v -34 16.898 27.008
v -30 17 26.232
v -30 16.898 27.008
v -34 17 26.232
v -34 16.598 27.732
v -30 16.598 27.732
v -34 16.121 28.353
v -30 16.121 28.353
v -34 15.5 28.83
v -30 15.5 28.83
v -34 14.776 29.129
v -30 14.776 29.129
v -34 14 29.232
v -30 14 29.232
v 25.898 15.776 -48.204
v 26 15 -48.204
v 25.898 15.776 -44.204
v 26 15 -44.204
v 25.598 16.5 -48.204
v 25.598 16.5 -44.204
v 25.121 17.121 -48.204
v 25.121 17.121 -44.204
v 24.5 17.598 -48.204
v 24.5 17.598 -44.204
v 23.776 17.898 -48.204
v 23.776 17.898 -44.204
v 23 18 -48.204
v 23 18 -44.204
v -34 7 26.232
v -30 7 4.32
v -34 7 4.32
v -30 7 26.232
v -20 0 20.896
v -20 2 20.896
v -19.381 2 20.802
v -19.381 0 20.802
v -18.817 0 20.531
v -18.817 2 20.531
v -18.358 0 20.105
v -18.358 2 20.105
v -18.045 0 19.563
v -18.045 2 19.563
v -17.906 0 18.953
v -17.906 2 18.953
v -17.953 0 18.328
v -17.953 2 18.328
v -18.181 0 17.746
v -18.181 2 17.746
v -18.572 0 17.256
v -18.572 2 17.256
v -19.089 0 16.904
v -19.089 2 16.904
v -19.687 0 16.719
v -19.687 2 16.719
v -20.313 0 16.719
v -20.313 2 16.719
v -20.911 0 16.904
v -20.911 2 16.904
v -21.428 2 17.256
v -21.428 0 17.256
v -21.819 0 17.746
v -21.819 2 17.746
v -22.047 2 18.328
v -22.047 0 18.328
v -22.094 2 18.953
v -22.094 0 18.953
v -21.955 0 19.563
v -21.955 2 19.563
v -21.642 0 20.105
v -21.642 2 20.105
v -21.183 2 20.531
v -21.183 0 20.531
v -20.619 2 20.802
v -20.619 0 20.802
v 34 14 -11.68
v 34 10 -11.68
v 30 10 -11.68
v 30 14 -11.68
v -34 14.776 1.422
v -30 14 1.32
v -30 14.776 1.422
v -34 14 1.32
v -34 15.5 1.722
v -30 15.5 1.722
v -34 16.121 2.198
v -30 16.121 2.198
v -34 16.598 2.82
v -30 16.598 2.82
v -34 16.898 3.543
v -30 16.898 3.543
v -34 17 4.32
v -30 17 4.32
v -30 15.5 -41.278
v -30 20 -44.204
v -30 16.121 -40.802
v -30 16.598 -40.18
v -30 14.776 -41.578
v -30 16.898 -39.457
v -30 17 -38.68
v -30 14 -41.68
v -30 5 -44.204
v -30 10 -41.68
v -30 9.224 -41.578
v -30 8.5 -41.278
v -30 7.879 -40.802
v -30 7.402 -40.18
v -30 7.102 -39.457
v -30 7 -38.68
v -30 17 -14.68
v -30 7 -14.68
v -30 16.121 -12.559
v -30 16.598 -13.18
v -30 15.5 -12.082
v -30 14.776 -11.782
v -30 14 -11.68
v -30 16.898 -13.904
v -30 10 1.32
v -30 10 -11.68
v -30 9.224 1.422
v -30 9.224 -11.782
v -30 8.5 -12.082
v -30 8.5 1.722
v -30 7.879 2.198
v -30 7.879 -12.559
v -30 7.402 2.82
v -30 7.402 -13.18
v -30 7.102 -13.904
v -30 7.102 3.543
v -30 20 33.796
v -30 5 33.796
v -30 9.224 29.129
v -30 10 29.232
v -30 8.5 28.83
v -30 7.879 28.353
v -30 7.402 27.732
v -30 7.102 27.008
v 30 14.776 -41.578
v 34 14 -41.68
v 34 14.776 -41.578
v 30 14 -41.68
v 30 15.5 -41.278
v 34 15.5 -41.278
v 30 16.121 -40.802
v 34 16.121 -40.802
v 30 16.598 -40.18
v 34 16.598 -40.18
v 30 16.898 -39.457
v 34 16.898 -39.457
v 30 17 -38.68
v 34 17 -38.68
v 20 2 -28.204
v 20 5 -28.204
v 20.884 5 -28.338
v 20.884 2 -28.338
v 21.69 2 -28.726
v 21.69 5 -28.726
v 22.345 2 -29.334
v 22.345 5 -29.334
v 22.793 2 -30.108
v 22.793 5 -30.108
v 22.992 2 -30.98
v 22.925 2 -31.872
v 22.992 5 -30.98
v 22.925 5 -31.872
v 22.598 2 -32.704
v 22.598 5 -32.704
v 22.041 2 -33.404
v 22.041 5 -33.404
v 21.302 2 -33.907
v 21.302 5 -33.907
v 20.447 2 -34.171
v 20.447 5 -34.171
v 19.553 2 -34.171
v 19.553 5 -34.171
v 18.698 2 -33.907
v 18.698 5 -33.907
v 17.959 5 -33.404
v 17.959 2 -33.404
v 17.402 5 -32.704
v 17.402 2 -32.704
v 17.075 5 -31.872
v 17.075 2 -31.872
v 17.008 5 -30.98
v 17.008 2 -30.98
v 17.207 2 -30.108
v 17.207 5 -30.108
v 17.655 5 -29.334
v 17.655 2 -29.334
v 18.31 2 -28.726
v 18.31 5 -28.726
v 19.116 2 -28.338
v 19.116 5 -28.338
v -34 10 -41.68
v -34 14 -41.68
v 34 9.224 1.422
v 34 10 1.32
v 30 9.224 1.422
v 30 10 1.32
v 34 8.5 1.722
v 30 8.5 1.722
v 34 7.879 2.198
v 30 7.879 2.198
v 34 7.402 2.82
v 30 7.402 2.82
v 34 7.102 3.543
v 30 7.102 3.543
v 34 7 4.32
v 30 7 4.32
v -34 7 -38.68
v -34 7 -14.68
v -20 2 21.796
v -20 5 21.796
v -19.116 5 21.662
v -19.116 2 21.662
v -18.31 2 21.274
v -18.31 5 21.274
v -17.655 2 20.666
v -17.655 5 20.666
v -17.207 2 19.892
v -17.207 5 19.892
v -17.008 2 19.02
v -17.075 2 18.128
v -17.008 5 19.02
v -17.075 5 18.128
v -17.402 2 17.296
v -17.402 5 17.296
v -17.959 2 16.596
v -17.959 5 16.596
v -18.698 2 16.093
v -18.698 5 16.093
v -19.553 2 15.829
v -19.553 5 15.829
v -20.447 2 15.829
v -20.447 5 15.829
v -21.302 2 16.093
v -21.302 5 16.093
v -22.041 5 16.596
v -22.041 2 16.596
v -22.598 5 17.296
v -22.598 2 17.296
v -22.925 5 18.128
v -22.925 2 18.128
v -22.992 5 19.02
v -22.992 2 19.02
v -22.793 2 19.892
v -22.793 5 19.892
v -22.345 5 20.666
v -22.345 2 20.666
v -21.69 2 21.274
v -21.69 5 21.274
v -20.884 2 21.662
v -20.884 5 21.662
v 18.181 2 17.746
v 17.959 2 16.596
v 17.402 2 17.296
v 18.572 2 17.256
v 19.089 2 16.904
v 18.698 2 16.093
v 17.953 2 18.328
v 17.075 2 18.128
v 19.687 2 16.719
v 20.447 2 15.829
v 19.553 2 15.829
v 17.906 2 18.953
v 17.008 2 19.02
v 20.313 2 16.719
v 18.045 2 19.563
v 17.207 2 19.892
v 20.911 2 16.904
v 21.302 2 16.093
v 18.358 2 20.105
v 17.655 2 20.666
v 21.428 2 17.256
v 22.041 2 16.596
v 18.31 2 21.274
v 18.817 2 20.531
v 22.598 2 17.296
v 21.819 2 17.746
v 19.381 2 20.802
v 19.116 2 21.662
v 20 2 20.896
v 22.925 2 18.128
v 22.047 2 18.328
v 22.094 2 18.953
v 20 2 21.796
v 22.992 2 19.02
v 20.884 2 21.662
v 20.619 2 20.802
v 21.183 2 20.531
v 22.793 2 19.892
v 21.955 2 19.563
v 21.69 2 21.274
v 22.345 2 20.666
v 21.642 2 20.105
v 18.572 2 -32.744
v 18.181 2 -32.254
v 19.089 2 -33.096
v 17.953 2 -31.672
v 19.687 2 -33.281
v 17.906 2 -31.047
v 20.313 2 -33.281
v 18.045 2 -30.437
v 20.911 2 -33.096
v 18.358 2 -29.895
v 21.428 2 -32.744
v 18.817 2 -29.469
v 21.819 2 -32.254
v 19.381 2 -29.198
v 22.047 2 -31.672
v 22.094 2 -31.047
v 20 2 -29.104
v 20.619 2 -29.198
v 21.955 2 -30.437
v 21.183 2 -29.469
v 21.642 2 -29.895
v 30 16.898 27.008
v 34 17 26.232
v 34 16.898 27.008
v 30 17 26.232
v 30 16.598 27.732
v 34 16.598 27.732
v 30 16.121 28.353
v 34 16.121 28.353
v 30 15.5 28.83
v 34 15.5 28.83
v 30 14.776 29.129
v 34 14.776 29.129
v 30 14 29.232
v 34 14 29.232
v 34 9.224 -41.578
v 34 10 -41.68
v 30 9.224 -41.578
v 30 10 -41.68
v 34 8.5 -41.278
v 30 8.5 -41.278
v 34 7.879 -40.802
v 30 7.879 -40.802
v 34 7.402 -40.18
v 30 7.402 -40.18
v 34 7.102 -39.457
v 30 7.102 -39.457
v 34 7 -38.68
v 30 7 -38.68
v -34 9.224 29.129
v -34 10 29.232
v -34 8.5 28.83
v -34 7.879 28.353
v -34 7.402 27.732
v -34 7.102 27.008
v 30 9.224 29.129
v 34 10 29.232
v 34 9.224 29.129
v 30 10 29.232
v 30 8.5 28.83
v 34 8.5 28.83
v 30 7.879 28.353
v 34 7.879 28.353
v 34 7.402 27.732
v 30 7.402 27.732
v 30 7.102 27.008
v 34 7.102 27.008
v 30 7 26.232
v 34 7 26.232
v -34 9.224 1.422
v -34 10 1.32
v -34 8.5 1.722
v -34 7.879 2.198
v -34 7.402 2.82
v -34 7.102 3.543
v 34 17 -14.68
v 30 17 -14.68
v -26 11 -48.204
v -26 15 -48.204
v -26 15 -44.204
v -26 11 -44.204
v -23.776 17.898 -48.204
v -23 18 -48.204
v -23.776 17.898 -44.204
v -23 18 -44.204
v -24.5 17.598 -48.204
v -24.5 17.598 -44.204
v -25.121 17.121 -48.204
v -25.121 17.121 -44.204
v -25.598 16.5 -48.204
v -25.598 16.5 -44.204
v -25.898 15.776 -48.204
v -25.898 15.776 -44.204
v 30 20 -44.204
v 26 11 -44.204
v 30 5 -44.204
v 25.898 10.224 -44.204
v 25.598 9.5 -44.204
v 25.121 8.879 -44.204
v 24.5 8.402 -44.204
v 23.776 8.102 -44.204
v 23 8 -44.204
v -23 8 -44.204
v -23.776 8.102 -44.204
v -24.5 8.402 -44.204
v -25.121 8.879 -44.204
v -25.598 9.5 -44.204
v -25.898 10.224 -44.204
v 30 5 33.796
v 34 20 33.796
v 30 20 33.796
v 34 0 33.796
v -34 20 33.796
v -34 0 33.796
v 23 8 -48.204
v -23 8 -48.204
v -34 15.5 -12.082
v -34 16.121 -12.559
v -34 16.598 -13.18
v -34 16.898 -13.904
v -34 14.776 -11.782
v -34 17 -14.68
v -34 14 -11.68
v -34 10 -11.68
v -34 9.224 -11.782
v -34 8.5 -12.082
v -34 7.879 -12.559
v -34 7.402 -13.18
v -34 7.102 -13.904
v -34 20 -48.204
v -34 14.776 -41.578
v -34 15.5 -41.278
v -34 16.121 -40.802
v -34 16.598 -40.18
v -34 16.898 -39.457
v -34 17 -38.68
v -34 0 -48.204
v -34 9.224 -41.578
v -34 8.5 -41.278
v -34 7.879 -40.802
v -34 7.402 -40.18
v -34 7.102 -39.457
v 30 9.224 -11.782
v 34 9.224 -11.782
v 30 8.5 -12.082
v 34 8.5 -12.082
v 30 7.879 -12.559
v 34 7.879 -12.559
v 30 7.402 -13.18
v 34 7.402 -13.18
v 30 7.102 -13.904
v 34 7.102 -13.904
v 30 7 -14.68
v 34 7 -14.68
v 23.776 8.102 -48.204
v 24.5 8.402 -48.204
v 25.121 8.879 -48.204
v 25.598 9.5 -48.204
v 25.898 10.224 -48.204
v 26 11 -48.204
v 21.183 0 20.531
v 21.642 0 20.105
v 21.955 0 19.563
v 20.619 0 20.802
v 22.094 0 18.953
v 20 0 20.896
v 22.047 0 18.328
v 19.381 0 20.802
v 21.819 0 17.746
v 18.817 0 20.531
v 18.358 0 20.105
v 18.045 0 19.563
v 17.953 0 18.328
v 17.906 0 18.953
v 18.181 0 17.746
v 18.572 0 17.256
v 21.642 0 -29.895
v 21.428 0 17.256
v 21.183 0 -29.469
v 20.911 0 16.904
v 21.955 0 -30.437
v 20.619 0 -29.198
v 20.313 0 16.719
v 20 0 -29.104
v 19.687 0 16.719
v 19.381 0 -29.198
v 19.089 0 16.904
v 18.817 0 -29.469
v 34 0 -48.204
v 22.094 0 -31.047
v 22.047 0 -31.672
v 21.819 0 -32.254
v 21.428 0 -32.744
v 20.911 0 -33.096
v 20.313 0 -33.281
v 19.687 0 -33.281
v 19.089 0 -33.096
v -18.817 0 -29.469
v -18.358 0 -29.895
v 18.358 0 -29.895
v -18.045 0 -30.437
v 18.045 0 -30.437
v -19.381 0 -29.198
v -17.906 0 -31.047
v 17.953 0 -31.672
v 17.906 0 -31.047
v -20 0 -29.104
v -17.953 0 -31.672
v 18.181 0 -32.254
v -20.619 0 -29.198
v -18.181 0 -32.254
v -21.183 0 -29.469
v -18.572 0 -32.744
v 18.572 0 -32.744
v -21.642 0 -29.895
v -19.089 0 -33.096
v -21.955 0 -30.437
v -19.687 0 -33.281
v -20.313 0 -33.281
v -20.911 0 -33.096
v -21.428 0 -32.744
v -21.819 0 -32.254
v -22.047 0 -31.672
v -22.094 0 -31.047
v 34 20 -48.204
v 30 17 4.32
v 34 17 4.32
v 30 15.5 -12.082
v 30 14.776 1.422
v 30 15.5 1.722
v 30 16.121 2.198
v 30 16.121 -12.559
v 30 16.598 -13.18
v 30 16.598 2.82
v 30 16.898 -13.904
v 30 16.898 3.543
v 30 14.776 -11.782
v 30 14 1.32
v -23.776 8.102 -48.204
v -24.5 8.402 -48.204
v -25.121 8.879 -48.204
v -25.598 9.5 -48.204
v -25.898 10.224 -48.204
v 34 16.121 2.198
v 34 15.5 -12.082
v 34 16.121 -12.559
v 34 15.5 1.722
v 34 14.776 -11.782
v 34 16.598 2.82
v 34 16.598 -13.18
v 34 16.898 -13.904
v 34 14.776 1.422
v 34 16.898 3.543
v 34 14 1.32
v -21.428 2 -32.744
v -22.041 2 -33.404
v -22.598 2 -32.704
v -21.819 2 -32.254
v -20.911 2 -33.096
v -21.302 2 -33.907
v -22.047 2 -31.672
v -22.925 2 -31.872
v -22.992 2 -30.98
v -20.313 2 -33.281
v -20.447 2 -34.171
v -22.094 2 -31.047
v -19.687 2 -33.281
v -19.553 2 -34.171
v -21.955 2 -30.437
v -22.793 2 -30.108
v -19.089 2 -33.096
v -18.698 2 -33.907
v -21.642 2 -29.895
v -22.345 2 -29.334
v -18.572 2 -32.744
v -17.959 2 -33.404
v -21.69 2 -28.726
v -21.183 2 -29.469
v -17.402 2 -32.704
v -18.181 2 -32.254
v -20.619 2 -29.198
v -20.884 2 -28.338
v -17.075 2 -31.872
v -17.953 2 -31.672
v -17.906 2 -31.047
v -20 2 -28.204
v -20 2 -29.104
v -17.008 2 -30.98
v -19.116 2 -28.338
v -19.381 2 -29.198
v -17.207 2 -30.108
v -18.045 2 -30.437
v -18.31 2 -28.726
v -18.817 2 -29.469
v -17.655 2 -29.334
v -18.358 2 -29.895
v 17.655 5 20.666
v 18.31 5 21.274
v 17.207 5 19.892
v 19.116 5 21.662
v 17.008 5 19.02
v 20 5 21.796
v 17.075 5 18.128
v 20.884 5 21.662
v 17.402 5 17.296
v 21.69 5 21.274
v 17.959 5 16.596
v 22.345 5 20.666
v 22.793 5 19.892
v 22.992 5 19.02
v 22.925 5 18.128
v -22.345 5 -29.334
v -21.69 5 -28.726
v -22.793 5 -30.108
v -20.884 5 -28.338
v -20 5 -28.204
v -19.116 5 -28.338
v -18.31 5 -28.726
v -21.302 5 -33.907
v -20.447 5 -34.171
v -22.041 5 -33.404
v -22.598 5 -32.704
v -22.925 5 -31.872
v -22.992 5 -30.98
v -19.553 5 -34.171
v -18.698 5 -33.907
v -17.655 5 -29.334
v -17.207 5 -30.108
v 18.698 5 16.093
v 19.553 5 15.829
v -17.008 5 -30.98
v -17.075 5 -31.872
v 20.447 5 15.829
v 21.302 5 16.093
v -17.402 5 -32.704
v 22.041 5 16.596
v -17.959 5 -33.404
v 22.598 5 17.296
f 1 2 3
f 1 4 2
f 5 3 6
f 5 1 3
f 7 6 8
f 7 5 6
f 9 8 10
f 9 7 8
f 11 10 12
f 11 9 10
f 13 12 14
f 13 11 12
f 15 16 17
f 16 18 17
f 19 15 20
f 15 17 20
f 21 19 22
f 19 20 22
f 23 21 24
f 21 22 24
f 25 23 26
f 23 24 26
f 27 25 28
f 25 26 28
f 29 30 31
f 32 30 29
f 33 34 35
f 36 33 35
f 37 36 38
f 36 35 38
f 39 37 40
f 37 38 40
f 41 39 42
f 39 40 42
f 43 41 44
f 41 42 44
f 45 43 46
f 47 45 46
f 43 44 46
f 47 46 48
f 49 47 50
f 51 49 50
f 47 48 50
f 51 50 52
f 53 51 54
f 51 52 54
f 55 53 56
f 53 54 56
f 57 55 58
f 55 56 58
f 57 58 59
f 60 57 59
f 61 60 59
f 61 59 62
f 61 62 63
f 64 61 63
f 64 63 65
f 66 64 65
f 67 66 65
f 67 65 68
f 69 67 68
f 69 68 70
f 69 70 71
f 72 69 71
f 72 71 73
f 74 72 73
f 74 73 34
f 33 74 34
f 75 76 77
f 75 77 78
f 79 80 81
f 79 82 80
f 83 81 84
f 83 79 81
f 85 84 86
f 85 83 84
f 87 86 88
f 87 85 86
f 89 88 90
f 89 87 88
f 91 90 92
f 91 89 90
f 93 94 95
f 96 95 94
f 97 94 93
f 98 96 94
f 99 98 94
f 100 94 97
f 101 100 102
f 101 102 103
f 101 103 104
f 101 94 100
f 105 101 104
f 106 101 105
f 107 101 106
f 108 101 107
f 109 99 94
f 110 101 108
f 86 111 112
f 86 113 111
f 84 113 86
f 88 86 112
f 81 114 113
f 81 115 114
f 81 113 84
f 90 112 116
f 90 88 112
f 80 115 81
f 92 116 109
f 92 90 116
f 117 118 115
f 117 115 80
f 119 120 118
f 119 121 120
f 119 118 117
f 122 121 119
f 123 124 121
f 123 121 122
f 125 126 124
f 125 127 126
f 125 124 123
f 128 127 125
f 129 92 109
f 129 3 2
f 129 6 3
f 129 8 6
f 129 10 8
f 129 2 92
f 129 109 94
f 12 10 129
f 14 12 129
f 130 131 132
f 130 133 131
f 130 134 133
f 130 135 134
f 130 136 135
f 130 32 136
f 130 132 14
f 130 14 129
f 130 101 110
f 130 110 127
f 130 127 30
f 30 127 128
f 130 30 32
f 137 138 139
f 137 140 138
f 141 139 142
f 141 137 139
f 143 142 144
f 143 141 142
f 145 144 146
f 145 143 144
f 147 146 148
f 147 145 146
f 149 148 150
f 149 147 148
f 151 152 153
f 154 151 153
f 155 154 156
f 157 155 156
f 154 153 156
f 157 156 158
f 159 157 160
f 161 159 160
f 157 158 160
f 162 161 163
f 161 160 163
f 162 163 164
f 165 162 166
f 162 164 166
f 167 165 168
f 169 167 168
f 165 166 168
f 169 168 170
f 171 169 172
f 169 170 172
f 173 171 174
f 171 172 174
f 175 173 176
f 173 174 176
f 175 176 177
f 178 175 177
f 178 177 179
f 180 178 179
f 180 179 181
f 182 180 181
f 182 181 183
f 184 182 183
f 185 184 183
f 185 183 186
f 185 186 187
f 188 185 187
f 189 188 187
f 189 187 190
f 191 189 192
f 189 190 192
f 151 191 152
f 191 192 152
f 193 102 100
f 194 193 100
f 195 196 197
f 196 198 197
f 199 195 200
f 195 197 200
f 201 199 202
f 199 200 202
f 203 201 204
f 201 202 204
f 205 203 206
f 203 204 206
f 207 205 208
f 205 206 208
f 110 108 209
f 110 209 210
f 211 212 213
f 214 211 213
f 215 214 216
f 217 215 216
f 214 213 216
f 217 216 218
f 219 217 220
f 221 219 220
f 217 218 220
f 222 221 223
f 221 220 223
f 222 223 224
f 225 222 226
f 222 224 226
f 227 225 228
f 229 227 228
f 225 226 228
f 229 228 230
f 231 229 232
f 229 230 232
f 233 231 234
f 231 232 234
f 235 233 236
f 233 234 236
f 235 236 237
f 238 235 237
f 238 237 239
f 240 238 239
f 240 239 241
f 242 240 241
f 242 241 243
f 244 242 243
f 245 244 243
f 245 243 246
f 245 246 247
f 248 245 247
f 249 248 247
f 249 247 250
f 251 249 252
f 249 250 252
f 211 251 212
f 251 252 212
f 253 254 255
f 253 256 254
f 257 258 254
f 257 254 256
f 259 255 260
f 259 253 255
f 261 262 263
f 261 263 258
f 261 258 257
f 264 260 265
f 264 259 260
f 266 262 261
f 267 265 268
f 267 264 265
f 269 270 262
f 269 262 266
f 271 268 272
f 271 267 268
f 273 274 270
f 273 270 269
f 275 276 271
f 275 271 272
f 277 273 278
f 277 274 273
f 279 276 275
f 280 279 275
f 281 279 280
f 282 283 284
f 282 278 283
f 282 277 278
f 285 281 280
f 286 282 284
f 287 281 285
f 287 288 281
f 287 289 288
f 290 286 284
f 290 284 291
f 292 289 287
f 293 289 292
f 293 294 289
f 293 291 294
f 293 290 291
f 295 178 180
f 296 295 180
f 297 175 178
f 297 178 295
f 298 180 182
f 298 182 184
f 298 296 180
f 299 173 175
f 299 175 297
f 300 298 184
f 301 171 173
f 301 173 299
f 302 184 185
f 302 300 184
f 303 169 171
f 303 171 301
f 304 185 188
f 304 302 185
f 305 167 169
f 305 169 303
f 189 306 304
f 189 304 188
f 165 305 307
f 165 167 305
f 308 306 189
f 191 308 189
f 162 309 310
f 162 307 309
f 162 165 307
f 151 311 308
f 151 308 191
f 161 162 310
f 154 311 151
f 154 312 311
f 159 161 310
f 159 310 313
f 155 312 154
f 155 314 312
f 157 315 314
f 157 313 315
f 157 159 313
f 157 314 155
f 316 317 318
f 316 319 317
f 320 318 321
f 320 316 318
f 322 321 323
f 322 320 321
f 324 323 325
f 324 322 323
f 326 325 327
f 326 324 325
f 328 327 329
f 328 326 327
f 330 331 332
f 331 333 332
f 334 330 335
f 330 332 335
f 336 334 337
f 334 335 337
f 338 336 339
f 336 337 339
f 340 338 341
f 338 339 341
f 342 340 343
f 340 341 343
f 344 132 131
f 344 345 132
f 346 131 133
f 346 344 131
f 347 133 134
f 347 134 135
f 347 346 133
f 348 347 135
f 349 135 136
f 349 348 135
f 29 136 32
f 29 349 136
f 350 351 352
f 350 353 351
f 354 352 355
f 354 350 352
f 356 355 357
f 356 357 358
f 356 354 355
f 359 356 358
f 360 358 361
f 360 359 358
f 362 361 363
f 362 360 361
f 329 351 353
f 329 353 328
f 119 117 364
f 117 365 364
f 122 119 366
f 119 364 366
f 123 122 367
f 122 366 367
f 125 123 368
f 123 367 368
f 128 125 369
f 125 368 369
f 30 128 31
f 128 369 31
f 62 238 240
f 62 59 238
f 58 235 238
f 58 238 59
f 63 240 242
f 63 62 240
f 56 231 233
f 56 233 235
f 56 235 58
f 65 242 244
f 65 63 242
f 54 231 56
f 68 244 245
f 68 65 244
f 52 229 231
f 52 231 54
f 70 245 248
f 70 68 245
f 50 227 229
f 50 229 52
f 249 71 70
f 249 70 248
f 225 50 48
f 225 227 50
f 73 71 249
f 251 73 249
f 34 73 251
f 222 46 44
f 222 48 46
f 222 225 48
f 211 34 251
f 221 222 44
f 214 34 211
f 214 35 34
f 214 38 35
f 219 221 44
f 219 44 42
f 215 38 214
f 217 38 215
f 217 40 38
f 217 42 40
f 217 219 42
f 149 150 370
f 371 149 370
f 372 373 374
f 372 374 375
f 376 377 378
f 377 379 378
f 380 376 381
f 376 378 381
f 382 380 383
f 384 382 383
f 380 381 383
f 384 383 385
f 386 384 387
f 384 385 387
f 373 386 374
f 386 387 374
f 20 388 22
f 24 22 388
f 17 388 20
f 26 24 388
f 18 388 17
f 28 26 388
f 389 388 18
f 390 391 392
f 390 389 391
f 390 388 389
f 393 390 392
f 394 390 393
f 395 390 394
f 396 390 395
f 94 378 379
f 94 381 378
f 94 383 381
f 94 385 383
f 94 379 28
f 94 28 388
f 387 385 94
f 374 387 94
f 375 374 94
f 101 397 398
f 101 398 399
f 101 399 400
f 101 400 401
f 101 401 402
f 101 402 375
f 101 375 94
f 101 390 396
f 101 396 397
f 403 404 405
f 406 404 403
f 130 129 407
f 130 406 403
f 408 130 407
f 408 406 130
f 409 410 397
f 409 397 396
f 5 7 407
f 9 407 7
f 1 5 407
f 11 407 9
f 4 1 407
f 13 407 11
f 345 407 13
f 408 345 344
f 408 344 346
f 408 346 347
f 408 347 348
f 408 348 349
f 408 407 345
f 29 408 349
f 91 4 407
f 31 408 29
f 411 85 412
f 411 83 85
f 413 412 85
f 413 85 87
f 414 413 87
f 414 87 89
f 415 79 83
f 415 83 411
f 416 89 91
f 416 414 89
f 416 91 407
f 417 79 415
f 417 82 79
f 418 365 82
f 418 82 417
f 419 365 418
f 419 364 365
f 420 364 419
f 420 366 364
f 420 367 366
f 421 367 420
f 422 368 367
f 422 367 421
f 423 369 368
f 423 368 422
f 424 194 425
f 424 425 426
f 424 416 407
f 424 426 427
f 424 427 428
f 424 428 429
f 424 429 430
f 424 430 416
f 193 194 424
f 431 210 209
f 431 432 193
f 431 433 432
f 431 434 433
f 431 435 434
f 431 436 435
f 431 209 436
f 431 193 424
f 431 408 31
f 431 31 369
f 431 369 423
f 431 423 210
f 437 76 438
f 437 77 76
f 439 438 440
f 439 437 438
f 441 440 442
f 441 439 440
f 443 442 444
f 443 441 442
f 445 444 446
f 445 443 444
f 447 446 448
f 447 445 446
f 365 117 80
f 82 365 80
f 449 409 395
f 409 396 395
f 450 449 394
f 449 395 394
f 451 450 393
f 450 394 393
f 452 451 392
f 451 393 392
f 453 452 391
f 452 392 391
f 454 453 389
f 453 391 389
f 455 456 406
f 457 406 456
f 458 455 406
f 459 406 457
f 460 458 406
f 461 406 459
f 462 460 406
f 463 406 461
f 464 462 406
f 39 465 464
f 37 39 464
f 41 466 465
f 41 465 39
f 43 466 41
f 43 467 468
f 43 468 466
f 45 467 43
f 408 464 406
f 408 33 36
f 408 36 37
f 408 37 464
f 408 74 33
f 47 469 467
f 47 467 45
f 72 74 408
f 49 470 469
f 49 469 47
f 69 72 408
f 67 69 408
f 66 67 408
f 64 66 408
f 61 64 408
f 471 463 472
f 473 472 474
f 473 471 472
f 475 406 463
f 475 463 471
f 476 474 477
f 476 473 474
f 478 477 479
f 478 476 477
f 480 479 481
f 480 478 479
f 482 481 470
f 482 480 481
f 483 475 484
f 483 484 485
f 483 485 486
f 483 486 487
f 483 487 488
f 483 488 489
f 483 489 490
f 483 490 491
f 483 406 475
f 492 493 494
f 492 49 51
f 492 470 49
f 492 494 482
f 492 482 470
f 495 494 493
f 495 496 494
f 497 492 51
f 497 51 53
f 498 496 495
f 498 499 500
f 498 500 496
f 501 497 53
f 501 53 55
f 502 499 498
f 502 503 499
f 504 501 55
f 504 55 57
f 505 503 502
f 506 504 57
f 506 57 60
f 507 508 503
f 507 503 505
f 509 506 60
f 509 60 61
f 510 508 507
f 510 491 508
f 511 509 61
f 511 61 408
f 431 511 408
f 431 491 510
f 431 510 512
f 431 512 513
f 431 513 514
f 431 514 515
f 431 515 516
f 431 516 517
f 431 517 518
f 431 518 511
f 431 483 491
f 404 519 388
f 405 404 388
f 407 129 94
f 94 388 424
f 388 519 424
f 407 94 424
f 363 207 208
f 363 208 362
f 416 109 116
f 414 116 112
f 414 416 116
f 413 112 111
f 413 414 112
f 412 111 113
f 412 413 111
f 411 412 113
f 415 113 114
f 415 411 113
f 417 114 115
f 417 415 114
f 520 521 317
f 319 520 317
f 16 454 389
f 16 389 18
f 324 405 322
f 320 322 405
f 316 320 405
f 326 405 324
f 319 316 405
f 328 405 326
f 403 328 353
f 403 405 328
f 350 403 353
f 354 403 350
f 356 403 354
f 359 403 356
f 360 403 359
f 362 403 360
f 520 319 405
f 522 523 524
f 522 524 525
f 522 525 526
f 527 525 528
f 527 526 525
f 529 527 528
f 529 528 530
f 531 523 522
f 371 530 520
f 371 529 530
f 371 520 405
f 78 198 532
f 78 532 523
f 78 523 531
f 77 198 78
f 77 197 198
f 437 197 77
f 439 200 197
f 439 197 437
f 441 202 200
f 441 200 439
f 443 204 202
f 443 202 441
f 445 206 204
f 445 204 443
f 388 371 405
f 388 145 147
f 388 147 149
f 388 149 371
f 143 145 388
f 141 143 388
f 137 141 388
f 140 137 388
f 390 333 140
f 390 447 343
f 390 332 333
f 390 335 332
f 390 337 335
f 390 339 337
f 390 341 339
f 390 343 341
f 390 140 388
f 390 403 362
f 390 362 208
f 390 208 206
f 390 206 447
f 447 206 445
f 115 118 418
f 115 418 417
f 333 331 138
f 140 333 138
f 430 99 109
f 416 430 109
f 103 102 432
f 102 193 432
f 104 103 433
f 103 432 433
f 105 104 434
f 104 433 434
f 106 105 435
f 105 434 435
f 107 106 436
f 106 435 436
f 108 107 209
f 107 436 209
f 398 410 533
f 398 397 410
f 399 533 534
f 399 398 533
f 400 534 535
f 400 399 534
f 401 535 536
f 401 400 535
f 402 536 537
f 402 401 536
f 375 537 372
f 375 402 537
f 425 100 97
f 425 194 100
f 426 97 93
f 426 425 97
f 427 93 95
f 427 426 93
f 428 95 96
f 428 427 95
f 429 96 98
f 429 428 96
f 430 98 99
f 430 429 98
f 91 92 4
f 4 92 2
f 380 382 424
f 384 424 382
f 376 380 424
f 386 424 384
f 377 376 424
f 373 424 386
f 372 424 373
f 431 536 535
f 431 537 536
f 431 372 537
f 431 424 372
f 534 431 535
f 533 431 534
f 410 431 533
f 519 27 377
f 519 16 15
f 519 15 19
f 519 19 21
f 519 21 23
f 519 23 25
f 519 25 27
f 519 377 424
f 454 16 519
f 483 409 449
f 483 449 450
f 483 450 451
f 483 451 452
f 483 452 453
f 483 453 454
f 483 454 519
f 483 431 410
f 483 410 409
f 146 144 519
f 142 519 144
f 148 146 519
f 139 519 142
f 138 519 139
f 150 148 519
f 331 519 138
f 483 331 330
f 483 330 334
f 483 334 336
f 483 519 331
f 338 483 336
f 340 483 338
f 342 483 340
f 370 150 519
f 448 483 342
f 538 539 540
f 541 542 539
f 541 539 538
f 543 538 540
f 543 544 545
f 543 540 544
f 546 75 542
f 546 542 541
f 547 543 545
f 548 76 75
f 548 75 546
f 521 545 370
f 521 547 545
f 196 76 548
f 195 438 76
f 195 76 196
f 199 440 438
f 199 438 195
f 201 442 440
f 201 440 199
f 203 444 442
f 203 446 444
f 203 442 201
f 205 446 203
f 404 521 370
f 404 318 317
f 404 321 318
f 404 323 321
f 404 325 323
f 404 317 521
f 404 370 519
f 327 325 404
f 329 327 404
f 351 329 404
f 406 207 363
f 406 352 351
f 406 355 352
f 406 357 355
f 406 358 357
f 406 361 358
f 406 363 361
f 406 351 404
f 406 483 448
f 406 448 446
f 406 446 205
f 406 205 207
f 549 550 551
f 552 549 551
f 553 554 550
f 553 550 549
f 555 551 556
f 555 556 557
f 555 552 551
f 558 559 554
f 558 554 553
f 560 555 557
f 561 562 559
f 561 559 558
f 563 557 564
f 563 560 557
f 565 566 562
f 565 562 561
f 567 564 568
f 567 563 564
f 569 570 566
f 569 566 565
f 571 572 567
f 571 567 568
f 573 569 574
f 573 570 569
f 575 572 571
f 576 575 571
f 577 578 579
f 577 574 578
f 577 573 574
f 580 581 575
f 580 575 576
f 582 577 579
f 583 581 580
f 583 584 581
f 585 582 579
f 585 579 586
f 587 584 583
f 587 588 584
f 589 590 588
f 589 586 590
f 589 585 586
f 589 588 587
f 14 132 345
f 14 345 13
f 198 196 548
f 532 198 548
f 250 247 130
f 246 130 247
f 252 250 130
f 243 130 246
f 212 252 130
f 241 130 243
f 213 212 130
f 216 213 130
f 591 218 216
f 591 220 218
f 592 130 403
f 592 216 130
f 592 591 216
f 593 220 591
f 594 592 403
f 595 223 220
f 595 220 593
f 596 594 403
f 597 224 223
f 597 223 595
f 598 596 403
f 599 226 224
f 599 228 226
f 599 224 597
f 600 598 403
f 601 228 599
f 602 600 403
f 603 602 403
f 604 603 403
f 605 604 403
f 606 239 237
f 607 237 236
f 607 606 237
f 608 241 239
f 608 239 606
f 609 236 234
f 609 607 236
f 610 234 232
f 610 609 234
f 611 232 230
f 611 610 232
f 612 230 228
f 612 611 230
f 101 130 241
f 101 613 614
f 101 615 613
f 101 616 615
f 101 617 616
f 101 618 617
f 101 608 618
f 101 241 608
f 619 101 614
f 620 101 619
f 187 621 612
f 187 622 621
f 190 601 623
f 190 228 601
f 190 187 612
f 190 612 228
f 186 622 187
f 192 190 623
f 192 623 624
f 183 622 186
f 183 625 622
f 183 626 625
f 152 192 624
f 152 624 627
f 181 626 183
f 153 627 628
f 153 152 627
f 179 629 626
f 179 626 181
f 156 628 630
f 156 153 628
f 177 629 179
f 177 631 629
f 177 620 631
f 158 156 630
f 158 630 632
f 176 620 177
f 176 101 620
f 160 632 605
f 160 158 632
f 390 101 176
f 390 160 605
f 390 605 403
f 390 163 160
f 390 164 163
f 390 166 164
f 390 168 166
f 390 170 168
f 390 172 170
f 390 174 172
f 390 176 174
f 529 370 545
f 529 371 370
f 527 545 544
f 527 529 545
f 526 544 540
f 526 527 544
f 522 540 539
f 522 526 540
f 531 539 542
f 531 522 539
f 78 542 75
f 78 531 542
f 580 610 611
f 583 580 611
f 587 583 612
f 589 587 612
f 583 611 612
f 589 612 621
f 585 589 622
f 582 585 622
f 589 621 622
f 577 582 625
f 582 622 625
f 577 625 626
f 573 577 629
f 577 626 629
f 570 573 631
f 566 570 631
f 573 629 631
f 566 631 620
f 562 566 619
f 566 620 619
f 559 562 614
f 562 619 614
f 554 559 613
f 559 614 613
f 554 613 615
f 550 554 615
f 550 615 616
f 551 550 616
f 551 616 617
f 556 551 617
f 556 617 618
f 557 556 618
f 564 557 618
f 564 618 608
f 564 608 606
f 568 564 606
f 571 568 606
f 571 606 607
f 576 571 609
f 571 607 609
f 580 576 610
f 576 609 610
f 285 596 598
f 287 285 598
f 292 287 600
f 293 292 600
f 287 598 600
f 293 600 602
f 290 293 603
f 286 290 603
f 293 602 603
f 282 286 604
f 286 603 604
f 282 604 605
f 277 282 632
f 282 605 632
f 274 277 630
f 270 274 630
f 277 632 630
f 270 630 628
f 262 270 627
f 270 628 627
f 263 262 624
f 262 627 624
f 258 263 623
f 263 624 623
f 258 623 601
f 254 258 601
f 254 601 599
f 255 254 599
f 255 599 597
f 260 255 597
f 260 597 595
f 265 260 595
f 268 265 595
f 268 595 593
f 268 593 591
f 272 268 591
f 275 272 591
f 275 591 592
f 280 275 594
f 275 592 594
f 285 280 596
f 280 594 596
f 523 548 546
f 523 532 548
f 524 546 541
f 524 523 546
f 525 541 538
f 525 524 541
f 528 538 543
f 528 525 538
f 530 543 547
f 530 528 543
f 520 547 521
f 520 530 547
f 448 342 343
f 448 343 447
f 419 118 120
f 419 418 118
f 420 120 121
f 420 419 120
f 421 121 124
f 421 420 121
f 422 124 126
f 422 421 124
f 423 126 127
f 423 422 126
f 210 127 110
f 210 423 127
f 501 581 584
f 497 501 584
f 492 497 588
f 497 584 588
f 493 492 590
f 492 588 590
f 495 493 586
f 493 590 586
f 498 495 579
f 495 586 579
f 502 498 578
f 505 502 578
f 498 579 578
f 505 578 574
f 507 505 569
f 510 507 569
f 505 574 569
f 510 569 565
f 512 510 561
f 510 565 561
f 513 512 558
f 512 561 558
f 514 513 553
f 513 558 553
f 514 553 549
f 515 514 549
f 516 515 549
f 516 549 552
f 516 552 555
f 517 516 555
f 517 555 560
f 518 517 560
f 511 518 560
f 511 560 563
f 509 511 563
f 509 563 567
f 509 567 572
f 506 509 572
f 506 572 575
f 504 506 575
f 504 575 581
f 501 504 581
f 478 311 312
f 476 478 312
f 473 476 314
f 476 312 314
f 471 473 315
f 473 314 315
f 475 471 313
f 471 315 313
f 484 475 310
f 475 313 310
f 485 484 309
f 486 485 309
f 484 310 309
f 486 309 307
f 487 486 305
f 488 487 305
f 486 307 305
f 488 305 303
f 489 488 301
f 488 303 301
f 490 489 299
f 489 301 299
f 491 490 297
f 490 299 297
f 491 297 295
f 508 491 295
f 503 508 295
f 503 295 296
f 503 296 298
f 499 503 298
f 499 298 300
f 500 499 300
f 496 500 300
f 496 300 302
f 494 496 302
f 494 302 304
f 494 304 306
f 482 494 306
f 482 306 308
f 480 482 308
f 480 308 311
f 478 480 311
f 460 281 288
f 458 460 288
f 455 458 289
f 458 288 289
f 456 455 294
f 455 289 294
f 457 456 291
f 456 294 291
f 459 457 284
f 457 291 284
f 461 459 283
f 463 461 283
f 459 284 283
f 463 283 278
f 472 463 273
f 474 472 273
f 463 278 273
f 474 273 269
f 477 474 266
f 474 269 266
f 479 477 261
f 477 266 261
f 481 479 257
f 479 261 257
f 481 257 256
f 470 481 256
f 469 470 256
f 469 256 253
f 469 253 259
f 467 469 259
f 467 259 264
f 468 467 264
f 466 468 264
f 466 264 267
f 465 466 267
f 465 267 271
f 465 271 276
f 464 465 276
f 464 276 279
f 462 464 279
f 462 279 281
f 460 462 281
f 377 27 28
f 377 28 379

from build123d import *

# Parameters (mm, degrees)
EXTRUDE_1_DEPTH          = 5
EXTRUDE_2_DEPTH          = 15
EXTRUDE_2_DEPTH_BACK     = 5
SKETCH_3_R               = 3
CUT_EXTRUDE_1_DEPTH      = 3
SKETCH_4_R               = 2.1
CUT_EXTRUDE_2_DEPTH      = 10
CUT_EXTRUDE_3_DEPTH      = 86.718512573
CUT_EXTRUDE_3_DEPTH_BACK = 86.718512573
SKETCH_5_W               = 30
SKETCH_5_H               = 10
SKETCH_5_W_2             = 27.91179781
FILLET_1_R               = 3
CUT_EXTRUDE_4_DEPTH      = 88.407093534
CUT_EXTRUDE_4_DEPTH_BACK = 88.407093534
FILLET_2_R               = 3


with BuildPart() as part:
    # 草图1 → 凸台-拉伸1 (new body)
    with BuildSketch(Plane(origin=(0, 0, 0), x_dir=(1, 0, 0), z_dir=(0, 1, 0))):
        Polygon((0, 44.204391892), (-30, 44.204391892), (-30, -33.795608108), (0, -33.795608108), (30, -33.795608108), (30, 44.204391892), align=None)
    extrude(amount=EXTRUDE_1_DEPTH)

    # 草图2 → 凸台-拉伸2 (add, two sides: drawn at the far end of the back side and taken through both)
    with BuildSketch(Plane(origin=(0, 5, 0), x_dir=(1, 0, 0), z_dir=(0, 1, 0)).offset(-EXTRUDE_2_DEPTH_BACK)):
        Polygon((-30, -33.795608108), (-34, -33.795608108), (-34, 48.204391892), (34, 48.204391892), (34, -33.795608108), (30, -33.795608108), (30, 44.204391892), (-30, 44.204391892), align=None)
    extrude(amount=EXTRUDE_2_DEPTH + EXTRUDE_2_DEPTH_BACK)

    # 草图3 → 切除-拉伸1 (cut)
    with BuildSketch(Plane(origin=(0, 5, 0), x_dir=(1, 0, 0), z_dir=(0, 1, 0))):
        with Locations(Location((-20, 31.204391892, 0), (0, 0, 270))):
            Circle(SKETCH_3_R)
        with Locations(Location((20, 31.204391892, 0), (0, 0, 270))):
            Circle(SKETCH_3_R)
        with Locations(Location((-20, -18.795608108, 0), (0, 0, 270))):
            Circle(SKETCH_3_R)
        with Locations(Location((20, -18.795608108, 0), (0, 0, 270))):
            Circle(SKETCH_3_R)
    extrude(amount=-CUT_EXTRUDE_1_DEPTH, mode=Mode.SUBTRACT)

    # 草图4 → 切除-拉伸2 (cut)
    with BuildSketch(Plane(origin=(0, 2, 0), x_dir=(1, 0, 0), z_dir=(0, 1, 0))):
        with Locations(Location((-20, 31.204391892, 0), (0, 0, 270))):
            Circle(SKETCH_4_R)
        with Locations(Location((20, 31.204391892, 0), (0, 0, 270))):
            Circle(SKETCH_4_R)
        with Locations(Location((20, -18.795608108, 0), (0, 0, 270))):
            Circle(SKETCH_4_R)
        with Locations(Location((-20, -18.795608108, 0), (0, 0, 270))):
            Circle(SKETCH_4_R)
    extrude(amount=-CUT_EXTRUDE_2_DEPTH, mode=Mode.SUBTRACT)

    # 草图5 → 切除-拉伸3 (cut, two sides: drawn at the far end of the back side and taken through both)
    with BuildSketch(Plane.ZY.offset(34).offset(-CUT_EXTRUDE_3_DEPTH_BACK)):
        with Locations((-26.680193, 12)):
            Rectangle(SKETCH_5_W, SKETCH_5_H)
        with Locations((15.275705905, 12)):
            Rectangle(SKETCH_5_W_2, SKETCH_5_H)
    extrude(amount=CUT_EXTRUDE_3_DEPTH + CUT_EXTRUDE_3_DEPTH_BACK, mode=Mode.SUBTRACT)

    # 圆角1
    fillet_1_edges = [part.edges().sort_by_distance(p)[0] for p in [
        (-32, 17, -41.680193),
        (32, 17, -41.680193),
        (-32, 17, -11.680193),
        (32, 17, -11.680193),
        (-32, 7, -11.680193),
        (32, 7, -11.680193),
        (-32, 7, -41.680193),
        (32, 7, -41.680193),
        (-32, 17, 1.319807),
        (32, 17, 1.319807),
        (-32, 17, 29.23160481),
        (32, 17, 29.23160481),
        (-32, 7, 29.23160481),
        (32, 7, 29.23160481),
        (-32, 7, 1.319807),
        (32, 7, 1.319807),
    ]]
    fillet(fillet_1_edges, radius=FILLET_1_R)

    # 草图6 → 切除-拉伸4 (cut, two sides: drawn at the far end of the back side and taken through both)
    with BuildSketch(Plane.XY.offset(-44.204391892).offset(-CUT_EXTRUDE_4_DEPTH_BACK)):
        Polygon((0, 18), (-26, 18), (-26, 8), (26, 8), (26, 18), align=None)
    extrude(amount=CUT_EXTRUDE_4_DEPTH + CUT_EXTRUDE_4_DEPTH_BACK, mode=Mode.SUBTRACT)

    # 圆角2
    fillet_2_edges = [part.edges().sort_by_distance(p)[0] for p in [
        (26, 18, -46.204391892),
        (26, 8, -46.204391892),
        (-26, 8, -46.204391892),
        (-26, 18, -46.204391892),
    ]]
    fillet(fillet_2_edges, radius=FILLET_2_R)


solid = part.part
